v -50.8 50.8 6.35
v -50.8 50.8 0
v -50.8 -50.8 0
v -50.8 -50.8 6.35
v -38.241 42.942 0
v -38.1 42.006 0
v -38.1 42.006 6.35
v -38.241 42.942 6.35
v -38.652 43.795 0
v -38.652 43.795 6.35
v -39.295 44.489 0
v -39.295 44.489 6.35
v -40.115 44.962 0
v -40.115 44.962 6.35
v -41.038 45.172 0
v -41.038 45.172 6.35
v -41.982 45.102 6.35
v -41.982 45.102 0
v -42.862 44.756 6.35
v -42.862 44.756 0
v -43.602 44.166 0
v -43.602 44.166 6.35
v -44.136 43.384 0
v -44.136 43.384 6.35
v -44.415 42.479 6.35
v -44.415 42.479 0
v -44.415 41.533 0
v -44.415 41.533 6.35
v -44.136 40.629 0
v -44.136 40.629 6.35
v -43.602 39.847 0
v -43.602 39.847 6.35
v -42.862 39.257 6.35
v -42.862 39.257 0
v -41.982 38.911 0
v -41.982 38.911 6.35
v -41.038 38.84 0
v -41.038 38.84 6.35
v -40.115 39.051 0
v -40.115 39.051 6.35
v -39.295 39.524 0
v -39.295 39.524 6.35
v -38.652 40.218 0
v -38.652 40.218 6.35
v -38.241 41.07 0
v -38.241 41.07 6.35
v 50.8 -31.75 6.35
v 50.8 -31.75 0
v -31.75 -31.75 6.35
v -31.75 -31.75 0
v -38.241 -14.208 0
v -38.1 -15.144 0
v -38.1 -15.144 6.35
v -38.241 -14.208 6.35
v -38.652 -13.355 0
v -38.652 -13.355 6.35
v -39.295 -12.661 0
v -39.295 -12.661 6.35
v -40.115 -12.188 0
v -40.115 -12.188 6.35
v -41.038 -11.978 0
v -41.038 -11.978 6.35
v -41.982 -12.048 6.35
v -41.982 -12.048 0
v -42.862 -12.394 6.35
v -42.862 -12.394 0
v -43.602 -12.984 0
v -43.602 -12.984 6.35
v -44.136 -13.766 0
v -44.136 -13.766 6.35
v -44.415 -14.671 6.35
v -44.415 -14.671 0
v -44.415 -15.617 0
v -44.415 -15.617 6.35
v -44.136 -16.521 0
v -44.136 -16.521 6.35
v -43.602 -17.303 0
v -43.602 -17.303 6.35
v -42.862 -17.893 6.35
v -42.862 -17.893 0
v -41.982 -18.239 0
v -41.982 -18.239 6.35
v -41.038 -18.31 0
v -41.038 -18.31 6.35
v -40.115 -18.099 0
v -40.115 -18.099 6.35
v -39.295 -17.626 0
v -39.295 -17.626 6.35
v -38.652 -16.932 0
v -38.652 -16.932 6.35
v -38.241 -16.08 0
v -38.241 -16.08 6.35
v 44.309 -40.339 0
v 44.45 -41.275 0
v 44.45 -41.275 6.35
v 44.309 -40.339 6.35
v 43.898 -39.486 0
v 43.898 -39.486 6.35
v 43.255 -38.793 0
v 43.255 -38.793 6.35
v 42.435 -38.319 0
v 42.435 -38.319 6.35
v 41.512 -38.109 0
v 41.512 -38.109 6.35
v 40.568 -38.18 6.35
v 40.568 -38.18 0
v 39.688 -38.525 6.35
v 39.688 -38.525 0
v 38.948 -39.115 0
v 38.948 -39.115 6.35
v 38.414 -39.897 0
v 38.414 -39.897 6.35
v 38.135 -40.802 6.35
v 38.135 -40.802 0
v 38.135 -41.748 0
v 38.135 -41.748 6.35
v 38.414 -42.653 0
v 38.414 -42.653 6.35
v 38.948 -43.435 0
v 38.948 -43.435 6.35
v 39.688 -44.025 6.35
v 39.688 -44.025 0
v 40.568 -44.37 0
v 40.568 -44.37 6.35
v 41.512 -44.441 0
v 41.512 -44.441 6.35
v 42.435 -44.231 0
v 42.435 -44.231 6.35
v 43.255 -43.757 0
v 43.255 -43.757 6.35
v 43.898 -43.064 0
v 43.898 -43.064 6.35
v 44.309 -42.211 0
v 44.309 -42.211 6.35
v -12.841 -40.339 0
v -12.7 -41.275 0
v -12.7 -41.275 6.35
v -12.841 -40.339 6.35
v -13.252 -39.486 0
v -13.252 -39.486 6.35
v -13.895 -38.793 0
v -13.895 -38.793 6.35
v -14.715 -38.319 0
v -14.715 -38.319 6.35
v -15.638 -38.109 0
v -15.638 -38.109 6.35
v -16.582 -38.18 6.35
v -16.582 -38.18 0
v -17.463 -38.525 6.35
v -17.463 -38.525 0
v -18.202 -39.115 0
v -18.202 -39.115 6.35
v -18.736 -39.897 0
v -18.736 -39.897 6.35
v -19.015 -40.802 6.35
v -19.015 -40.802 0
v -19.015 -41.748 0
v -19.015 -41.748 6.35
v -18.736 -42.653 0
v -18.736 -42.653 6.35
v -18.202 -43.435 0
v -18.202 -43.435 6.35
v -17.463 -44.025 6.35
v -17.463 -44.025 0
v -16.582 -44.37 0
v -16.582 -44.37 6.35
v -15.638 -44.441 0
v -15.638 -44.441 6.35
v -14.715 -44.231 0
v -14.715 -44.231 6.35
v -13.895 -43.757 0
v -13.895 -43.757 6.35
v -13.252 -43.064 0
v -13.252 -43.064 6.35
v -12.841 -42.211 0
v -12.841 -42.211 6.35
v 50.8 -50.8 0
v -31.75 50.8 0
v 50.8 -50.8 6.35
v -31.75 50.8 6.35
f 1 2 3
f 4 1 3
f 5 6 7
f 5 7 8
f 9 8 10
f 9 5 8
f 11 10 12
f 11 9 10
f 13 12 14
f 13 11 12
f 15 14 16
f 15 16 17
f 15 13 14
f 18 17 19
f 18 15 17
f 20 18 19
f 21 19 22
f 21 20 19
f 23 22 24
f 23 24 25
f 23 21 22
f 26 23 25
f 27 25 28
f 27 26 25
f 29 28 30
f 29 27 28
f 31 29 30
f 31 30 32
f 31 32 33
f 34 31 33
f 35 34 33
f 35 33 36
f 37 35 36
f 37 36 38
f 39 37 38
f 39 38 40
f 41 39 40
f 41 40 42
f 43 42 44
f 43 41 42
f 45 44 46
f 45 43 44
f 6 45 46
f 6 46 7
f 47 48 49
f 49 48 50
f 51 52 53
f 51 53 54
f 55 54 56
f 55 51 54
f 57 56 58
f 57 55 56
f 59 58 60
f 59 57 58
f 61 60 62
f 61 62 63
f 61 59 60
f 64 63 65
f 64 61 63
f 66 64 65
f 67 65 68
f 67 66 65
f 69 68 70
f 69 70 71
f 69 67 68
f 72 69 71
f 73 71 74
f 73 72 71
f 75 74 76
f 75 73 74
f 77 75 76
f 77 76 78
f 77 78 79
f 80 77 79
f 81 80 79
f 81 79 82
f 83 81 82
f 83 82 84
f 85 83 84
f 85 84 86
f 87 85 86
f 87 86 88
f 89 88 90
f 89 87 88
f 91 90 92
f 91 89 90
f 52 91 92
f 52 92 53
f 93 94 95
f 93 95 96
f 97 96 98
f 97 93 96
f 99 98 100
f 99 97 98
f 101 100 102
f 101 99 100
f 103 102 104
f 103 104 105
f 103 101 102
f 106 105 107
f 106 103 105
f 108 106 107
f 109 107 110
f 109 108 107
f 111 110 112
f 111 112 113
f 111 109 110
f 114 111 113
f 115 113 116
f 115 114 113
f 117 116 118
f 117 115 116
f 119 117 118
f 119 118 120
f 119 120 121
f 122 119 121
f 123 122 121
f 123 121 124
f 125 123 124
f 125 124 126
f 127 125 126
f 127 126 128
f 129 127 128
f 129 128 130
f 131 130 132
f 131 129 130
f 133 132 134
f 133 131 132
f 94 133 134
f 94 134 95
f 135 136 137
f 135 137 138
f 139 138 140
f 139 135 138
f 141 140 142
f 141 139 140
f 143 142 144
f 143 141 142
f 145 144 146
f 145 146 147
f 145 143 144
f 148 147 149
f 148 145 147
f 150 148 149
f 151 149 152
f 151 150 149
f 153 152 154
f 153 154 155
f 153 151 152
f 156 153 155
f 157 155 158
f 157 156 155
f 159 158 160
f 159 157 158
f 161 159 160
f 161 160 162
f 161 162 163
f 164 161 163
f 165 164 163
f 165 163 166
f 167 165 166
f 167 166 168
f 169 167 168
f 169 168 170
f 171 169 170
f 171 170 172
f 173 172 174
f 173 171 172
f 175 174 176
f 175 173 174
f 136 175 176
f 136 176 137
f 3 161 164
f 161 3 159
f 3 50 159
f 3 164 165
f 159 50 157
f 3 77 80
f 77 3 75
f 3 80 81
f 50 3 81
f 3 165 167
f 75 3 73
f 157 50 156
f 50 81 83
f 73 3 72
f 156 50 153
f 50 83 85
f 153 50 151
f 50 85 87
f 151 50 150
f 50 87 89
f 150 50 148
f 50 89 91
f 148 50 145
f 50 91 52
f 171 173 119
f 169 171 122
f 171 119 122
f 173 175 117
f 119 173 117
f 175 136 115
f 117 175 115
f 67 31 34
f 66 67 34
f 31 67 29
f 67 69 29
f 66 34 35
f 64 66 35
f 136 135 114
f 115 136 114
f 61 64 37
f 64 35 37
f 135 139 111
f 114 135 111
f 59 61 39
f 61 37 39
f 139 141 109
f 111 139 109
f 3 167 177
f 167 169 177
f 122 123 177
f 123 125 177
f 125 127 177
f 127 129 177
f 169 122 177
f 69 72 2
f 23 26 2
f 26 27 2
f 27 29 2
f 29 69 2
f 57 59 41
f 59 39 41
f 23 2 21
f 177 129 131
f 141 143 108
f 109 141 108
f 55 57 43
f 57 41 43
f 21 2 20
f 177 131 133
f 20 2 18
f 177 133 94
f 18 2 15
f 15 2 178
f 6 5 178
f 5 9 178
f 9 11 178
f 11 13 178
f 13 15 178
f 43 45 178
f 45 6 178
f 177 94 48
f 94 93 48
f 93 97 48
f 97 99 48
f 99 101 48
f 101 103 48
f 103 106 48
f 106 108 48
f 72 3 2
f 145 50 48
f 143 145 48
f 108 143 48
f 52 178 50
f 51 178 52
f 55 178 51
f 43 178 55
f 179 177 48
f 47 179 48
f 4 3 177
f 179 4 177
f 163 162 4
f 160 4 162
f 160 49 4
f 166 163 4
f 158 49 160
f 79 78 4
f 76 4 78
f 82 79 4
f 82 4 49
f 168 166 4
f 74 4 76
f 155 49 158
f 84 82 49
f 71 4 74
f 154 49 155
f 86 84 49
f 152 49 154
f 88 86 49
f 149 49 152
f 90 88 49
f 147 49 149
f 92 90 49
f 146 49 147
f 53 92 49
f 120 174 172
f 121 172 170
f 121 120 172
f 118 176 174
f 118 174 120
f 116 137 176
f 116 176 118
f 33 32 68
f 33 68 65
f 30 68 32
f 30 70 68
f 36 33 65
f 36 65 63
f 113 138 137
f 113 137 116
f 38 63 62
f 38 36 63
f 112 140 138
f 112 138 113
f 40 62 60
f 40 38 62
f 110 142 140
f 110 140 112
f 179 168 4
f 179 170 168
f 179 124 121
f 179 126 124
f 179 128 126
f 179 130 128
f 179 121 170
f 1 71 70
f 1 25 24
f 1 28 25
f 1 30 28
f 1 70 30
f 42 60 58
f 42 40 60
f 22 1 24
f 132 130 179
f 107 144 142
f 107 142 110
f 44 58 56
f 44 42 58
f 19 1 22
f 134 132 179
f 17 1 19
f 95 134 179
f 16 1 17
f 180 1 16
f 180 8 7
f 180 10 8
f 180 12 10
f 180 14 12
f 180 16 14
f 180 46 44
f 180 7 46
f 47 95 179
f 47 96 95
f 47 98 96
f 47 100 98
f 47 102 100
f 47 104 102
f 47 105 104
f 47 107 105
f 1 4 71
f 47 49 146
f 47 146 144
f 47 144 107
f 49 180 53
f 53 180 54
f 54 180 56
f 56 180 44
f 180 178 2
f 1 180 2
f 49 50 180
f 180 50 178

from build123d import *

# Parameters (mm, degrees)
F0_R     = 3.175
F1_DEPTH = 6.35


with BuildPart() as f1:
    # F0 (on Top) → F1 (new body)
    with BuildSketch(Plane.XY):
        Polygon((-31.75, 50.8), (-50.8, 50.8), (-50.8, -50.8), (50.8, -50.8), (50.8, -31.75), (-31.75, -31.75), align=None)
        with Locations((-15.875, -41.275)):
            Circle(F0_R, mode=Mode.SUBTRACT)
        with Locations((-41.275, -15.143792145)):
            Circle(F0_R, mode=Mode.SUBTRACT)
        with Locations((41.275, -41.275)):
            Circle(F0_R, mode=Mode.SUBTRACT)
        with Locations((-41.275, 42.006207855)):
            Circle(F0_R, mode=Mode.SUBTRACT)
    extrude(amount=F1_DEPTH)


solid = f1.part
